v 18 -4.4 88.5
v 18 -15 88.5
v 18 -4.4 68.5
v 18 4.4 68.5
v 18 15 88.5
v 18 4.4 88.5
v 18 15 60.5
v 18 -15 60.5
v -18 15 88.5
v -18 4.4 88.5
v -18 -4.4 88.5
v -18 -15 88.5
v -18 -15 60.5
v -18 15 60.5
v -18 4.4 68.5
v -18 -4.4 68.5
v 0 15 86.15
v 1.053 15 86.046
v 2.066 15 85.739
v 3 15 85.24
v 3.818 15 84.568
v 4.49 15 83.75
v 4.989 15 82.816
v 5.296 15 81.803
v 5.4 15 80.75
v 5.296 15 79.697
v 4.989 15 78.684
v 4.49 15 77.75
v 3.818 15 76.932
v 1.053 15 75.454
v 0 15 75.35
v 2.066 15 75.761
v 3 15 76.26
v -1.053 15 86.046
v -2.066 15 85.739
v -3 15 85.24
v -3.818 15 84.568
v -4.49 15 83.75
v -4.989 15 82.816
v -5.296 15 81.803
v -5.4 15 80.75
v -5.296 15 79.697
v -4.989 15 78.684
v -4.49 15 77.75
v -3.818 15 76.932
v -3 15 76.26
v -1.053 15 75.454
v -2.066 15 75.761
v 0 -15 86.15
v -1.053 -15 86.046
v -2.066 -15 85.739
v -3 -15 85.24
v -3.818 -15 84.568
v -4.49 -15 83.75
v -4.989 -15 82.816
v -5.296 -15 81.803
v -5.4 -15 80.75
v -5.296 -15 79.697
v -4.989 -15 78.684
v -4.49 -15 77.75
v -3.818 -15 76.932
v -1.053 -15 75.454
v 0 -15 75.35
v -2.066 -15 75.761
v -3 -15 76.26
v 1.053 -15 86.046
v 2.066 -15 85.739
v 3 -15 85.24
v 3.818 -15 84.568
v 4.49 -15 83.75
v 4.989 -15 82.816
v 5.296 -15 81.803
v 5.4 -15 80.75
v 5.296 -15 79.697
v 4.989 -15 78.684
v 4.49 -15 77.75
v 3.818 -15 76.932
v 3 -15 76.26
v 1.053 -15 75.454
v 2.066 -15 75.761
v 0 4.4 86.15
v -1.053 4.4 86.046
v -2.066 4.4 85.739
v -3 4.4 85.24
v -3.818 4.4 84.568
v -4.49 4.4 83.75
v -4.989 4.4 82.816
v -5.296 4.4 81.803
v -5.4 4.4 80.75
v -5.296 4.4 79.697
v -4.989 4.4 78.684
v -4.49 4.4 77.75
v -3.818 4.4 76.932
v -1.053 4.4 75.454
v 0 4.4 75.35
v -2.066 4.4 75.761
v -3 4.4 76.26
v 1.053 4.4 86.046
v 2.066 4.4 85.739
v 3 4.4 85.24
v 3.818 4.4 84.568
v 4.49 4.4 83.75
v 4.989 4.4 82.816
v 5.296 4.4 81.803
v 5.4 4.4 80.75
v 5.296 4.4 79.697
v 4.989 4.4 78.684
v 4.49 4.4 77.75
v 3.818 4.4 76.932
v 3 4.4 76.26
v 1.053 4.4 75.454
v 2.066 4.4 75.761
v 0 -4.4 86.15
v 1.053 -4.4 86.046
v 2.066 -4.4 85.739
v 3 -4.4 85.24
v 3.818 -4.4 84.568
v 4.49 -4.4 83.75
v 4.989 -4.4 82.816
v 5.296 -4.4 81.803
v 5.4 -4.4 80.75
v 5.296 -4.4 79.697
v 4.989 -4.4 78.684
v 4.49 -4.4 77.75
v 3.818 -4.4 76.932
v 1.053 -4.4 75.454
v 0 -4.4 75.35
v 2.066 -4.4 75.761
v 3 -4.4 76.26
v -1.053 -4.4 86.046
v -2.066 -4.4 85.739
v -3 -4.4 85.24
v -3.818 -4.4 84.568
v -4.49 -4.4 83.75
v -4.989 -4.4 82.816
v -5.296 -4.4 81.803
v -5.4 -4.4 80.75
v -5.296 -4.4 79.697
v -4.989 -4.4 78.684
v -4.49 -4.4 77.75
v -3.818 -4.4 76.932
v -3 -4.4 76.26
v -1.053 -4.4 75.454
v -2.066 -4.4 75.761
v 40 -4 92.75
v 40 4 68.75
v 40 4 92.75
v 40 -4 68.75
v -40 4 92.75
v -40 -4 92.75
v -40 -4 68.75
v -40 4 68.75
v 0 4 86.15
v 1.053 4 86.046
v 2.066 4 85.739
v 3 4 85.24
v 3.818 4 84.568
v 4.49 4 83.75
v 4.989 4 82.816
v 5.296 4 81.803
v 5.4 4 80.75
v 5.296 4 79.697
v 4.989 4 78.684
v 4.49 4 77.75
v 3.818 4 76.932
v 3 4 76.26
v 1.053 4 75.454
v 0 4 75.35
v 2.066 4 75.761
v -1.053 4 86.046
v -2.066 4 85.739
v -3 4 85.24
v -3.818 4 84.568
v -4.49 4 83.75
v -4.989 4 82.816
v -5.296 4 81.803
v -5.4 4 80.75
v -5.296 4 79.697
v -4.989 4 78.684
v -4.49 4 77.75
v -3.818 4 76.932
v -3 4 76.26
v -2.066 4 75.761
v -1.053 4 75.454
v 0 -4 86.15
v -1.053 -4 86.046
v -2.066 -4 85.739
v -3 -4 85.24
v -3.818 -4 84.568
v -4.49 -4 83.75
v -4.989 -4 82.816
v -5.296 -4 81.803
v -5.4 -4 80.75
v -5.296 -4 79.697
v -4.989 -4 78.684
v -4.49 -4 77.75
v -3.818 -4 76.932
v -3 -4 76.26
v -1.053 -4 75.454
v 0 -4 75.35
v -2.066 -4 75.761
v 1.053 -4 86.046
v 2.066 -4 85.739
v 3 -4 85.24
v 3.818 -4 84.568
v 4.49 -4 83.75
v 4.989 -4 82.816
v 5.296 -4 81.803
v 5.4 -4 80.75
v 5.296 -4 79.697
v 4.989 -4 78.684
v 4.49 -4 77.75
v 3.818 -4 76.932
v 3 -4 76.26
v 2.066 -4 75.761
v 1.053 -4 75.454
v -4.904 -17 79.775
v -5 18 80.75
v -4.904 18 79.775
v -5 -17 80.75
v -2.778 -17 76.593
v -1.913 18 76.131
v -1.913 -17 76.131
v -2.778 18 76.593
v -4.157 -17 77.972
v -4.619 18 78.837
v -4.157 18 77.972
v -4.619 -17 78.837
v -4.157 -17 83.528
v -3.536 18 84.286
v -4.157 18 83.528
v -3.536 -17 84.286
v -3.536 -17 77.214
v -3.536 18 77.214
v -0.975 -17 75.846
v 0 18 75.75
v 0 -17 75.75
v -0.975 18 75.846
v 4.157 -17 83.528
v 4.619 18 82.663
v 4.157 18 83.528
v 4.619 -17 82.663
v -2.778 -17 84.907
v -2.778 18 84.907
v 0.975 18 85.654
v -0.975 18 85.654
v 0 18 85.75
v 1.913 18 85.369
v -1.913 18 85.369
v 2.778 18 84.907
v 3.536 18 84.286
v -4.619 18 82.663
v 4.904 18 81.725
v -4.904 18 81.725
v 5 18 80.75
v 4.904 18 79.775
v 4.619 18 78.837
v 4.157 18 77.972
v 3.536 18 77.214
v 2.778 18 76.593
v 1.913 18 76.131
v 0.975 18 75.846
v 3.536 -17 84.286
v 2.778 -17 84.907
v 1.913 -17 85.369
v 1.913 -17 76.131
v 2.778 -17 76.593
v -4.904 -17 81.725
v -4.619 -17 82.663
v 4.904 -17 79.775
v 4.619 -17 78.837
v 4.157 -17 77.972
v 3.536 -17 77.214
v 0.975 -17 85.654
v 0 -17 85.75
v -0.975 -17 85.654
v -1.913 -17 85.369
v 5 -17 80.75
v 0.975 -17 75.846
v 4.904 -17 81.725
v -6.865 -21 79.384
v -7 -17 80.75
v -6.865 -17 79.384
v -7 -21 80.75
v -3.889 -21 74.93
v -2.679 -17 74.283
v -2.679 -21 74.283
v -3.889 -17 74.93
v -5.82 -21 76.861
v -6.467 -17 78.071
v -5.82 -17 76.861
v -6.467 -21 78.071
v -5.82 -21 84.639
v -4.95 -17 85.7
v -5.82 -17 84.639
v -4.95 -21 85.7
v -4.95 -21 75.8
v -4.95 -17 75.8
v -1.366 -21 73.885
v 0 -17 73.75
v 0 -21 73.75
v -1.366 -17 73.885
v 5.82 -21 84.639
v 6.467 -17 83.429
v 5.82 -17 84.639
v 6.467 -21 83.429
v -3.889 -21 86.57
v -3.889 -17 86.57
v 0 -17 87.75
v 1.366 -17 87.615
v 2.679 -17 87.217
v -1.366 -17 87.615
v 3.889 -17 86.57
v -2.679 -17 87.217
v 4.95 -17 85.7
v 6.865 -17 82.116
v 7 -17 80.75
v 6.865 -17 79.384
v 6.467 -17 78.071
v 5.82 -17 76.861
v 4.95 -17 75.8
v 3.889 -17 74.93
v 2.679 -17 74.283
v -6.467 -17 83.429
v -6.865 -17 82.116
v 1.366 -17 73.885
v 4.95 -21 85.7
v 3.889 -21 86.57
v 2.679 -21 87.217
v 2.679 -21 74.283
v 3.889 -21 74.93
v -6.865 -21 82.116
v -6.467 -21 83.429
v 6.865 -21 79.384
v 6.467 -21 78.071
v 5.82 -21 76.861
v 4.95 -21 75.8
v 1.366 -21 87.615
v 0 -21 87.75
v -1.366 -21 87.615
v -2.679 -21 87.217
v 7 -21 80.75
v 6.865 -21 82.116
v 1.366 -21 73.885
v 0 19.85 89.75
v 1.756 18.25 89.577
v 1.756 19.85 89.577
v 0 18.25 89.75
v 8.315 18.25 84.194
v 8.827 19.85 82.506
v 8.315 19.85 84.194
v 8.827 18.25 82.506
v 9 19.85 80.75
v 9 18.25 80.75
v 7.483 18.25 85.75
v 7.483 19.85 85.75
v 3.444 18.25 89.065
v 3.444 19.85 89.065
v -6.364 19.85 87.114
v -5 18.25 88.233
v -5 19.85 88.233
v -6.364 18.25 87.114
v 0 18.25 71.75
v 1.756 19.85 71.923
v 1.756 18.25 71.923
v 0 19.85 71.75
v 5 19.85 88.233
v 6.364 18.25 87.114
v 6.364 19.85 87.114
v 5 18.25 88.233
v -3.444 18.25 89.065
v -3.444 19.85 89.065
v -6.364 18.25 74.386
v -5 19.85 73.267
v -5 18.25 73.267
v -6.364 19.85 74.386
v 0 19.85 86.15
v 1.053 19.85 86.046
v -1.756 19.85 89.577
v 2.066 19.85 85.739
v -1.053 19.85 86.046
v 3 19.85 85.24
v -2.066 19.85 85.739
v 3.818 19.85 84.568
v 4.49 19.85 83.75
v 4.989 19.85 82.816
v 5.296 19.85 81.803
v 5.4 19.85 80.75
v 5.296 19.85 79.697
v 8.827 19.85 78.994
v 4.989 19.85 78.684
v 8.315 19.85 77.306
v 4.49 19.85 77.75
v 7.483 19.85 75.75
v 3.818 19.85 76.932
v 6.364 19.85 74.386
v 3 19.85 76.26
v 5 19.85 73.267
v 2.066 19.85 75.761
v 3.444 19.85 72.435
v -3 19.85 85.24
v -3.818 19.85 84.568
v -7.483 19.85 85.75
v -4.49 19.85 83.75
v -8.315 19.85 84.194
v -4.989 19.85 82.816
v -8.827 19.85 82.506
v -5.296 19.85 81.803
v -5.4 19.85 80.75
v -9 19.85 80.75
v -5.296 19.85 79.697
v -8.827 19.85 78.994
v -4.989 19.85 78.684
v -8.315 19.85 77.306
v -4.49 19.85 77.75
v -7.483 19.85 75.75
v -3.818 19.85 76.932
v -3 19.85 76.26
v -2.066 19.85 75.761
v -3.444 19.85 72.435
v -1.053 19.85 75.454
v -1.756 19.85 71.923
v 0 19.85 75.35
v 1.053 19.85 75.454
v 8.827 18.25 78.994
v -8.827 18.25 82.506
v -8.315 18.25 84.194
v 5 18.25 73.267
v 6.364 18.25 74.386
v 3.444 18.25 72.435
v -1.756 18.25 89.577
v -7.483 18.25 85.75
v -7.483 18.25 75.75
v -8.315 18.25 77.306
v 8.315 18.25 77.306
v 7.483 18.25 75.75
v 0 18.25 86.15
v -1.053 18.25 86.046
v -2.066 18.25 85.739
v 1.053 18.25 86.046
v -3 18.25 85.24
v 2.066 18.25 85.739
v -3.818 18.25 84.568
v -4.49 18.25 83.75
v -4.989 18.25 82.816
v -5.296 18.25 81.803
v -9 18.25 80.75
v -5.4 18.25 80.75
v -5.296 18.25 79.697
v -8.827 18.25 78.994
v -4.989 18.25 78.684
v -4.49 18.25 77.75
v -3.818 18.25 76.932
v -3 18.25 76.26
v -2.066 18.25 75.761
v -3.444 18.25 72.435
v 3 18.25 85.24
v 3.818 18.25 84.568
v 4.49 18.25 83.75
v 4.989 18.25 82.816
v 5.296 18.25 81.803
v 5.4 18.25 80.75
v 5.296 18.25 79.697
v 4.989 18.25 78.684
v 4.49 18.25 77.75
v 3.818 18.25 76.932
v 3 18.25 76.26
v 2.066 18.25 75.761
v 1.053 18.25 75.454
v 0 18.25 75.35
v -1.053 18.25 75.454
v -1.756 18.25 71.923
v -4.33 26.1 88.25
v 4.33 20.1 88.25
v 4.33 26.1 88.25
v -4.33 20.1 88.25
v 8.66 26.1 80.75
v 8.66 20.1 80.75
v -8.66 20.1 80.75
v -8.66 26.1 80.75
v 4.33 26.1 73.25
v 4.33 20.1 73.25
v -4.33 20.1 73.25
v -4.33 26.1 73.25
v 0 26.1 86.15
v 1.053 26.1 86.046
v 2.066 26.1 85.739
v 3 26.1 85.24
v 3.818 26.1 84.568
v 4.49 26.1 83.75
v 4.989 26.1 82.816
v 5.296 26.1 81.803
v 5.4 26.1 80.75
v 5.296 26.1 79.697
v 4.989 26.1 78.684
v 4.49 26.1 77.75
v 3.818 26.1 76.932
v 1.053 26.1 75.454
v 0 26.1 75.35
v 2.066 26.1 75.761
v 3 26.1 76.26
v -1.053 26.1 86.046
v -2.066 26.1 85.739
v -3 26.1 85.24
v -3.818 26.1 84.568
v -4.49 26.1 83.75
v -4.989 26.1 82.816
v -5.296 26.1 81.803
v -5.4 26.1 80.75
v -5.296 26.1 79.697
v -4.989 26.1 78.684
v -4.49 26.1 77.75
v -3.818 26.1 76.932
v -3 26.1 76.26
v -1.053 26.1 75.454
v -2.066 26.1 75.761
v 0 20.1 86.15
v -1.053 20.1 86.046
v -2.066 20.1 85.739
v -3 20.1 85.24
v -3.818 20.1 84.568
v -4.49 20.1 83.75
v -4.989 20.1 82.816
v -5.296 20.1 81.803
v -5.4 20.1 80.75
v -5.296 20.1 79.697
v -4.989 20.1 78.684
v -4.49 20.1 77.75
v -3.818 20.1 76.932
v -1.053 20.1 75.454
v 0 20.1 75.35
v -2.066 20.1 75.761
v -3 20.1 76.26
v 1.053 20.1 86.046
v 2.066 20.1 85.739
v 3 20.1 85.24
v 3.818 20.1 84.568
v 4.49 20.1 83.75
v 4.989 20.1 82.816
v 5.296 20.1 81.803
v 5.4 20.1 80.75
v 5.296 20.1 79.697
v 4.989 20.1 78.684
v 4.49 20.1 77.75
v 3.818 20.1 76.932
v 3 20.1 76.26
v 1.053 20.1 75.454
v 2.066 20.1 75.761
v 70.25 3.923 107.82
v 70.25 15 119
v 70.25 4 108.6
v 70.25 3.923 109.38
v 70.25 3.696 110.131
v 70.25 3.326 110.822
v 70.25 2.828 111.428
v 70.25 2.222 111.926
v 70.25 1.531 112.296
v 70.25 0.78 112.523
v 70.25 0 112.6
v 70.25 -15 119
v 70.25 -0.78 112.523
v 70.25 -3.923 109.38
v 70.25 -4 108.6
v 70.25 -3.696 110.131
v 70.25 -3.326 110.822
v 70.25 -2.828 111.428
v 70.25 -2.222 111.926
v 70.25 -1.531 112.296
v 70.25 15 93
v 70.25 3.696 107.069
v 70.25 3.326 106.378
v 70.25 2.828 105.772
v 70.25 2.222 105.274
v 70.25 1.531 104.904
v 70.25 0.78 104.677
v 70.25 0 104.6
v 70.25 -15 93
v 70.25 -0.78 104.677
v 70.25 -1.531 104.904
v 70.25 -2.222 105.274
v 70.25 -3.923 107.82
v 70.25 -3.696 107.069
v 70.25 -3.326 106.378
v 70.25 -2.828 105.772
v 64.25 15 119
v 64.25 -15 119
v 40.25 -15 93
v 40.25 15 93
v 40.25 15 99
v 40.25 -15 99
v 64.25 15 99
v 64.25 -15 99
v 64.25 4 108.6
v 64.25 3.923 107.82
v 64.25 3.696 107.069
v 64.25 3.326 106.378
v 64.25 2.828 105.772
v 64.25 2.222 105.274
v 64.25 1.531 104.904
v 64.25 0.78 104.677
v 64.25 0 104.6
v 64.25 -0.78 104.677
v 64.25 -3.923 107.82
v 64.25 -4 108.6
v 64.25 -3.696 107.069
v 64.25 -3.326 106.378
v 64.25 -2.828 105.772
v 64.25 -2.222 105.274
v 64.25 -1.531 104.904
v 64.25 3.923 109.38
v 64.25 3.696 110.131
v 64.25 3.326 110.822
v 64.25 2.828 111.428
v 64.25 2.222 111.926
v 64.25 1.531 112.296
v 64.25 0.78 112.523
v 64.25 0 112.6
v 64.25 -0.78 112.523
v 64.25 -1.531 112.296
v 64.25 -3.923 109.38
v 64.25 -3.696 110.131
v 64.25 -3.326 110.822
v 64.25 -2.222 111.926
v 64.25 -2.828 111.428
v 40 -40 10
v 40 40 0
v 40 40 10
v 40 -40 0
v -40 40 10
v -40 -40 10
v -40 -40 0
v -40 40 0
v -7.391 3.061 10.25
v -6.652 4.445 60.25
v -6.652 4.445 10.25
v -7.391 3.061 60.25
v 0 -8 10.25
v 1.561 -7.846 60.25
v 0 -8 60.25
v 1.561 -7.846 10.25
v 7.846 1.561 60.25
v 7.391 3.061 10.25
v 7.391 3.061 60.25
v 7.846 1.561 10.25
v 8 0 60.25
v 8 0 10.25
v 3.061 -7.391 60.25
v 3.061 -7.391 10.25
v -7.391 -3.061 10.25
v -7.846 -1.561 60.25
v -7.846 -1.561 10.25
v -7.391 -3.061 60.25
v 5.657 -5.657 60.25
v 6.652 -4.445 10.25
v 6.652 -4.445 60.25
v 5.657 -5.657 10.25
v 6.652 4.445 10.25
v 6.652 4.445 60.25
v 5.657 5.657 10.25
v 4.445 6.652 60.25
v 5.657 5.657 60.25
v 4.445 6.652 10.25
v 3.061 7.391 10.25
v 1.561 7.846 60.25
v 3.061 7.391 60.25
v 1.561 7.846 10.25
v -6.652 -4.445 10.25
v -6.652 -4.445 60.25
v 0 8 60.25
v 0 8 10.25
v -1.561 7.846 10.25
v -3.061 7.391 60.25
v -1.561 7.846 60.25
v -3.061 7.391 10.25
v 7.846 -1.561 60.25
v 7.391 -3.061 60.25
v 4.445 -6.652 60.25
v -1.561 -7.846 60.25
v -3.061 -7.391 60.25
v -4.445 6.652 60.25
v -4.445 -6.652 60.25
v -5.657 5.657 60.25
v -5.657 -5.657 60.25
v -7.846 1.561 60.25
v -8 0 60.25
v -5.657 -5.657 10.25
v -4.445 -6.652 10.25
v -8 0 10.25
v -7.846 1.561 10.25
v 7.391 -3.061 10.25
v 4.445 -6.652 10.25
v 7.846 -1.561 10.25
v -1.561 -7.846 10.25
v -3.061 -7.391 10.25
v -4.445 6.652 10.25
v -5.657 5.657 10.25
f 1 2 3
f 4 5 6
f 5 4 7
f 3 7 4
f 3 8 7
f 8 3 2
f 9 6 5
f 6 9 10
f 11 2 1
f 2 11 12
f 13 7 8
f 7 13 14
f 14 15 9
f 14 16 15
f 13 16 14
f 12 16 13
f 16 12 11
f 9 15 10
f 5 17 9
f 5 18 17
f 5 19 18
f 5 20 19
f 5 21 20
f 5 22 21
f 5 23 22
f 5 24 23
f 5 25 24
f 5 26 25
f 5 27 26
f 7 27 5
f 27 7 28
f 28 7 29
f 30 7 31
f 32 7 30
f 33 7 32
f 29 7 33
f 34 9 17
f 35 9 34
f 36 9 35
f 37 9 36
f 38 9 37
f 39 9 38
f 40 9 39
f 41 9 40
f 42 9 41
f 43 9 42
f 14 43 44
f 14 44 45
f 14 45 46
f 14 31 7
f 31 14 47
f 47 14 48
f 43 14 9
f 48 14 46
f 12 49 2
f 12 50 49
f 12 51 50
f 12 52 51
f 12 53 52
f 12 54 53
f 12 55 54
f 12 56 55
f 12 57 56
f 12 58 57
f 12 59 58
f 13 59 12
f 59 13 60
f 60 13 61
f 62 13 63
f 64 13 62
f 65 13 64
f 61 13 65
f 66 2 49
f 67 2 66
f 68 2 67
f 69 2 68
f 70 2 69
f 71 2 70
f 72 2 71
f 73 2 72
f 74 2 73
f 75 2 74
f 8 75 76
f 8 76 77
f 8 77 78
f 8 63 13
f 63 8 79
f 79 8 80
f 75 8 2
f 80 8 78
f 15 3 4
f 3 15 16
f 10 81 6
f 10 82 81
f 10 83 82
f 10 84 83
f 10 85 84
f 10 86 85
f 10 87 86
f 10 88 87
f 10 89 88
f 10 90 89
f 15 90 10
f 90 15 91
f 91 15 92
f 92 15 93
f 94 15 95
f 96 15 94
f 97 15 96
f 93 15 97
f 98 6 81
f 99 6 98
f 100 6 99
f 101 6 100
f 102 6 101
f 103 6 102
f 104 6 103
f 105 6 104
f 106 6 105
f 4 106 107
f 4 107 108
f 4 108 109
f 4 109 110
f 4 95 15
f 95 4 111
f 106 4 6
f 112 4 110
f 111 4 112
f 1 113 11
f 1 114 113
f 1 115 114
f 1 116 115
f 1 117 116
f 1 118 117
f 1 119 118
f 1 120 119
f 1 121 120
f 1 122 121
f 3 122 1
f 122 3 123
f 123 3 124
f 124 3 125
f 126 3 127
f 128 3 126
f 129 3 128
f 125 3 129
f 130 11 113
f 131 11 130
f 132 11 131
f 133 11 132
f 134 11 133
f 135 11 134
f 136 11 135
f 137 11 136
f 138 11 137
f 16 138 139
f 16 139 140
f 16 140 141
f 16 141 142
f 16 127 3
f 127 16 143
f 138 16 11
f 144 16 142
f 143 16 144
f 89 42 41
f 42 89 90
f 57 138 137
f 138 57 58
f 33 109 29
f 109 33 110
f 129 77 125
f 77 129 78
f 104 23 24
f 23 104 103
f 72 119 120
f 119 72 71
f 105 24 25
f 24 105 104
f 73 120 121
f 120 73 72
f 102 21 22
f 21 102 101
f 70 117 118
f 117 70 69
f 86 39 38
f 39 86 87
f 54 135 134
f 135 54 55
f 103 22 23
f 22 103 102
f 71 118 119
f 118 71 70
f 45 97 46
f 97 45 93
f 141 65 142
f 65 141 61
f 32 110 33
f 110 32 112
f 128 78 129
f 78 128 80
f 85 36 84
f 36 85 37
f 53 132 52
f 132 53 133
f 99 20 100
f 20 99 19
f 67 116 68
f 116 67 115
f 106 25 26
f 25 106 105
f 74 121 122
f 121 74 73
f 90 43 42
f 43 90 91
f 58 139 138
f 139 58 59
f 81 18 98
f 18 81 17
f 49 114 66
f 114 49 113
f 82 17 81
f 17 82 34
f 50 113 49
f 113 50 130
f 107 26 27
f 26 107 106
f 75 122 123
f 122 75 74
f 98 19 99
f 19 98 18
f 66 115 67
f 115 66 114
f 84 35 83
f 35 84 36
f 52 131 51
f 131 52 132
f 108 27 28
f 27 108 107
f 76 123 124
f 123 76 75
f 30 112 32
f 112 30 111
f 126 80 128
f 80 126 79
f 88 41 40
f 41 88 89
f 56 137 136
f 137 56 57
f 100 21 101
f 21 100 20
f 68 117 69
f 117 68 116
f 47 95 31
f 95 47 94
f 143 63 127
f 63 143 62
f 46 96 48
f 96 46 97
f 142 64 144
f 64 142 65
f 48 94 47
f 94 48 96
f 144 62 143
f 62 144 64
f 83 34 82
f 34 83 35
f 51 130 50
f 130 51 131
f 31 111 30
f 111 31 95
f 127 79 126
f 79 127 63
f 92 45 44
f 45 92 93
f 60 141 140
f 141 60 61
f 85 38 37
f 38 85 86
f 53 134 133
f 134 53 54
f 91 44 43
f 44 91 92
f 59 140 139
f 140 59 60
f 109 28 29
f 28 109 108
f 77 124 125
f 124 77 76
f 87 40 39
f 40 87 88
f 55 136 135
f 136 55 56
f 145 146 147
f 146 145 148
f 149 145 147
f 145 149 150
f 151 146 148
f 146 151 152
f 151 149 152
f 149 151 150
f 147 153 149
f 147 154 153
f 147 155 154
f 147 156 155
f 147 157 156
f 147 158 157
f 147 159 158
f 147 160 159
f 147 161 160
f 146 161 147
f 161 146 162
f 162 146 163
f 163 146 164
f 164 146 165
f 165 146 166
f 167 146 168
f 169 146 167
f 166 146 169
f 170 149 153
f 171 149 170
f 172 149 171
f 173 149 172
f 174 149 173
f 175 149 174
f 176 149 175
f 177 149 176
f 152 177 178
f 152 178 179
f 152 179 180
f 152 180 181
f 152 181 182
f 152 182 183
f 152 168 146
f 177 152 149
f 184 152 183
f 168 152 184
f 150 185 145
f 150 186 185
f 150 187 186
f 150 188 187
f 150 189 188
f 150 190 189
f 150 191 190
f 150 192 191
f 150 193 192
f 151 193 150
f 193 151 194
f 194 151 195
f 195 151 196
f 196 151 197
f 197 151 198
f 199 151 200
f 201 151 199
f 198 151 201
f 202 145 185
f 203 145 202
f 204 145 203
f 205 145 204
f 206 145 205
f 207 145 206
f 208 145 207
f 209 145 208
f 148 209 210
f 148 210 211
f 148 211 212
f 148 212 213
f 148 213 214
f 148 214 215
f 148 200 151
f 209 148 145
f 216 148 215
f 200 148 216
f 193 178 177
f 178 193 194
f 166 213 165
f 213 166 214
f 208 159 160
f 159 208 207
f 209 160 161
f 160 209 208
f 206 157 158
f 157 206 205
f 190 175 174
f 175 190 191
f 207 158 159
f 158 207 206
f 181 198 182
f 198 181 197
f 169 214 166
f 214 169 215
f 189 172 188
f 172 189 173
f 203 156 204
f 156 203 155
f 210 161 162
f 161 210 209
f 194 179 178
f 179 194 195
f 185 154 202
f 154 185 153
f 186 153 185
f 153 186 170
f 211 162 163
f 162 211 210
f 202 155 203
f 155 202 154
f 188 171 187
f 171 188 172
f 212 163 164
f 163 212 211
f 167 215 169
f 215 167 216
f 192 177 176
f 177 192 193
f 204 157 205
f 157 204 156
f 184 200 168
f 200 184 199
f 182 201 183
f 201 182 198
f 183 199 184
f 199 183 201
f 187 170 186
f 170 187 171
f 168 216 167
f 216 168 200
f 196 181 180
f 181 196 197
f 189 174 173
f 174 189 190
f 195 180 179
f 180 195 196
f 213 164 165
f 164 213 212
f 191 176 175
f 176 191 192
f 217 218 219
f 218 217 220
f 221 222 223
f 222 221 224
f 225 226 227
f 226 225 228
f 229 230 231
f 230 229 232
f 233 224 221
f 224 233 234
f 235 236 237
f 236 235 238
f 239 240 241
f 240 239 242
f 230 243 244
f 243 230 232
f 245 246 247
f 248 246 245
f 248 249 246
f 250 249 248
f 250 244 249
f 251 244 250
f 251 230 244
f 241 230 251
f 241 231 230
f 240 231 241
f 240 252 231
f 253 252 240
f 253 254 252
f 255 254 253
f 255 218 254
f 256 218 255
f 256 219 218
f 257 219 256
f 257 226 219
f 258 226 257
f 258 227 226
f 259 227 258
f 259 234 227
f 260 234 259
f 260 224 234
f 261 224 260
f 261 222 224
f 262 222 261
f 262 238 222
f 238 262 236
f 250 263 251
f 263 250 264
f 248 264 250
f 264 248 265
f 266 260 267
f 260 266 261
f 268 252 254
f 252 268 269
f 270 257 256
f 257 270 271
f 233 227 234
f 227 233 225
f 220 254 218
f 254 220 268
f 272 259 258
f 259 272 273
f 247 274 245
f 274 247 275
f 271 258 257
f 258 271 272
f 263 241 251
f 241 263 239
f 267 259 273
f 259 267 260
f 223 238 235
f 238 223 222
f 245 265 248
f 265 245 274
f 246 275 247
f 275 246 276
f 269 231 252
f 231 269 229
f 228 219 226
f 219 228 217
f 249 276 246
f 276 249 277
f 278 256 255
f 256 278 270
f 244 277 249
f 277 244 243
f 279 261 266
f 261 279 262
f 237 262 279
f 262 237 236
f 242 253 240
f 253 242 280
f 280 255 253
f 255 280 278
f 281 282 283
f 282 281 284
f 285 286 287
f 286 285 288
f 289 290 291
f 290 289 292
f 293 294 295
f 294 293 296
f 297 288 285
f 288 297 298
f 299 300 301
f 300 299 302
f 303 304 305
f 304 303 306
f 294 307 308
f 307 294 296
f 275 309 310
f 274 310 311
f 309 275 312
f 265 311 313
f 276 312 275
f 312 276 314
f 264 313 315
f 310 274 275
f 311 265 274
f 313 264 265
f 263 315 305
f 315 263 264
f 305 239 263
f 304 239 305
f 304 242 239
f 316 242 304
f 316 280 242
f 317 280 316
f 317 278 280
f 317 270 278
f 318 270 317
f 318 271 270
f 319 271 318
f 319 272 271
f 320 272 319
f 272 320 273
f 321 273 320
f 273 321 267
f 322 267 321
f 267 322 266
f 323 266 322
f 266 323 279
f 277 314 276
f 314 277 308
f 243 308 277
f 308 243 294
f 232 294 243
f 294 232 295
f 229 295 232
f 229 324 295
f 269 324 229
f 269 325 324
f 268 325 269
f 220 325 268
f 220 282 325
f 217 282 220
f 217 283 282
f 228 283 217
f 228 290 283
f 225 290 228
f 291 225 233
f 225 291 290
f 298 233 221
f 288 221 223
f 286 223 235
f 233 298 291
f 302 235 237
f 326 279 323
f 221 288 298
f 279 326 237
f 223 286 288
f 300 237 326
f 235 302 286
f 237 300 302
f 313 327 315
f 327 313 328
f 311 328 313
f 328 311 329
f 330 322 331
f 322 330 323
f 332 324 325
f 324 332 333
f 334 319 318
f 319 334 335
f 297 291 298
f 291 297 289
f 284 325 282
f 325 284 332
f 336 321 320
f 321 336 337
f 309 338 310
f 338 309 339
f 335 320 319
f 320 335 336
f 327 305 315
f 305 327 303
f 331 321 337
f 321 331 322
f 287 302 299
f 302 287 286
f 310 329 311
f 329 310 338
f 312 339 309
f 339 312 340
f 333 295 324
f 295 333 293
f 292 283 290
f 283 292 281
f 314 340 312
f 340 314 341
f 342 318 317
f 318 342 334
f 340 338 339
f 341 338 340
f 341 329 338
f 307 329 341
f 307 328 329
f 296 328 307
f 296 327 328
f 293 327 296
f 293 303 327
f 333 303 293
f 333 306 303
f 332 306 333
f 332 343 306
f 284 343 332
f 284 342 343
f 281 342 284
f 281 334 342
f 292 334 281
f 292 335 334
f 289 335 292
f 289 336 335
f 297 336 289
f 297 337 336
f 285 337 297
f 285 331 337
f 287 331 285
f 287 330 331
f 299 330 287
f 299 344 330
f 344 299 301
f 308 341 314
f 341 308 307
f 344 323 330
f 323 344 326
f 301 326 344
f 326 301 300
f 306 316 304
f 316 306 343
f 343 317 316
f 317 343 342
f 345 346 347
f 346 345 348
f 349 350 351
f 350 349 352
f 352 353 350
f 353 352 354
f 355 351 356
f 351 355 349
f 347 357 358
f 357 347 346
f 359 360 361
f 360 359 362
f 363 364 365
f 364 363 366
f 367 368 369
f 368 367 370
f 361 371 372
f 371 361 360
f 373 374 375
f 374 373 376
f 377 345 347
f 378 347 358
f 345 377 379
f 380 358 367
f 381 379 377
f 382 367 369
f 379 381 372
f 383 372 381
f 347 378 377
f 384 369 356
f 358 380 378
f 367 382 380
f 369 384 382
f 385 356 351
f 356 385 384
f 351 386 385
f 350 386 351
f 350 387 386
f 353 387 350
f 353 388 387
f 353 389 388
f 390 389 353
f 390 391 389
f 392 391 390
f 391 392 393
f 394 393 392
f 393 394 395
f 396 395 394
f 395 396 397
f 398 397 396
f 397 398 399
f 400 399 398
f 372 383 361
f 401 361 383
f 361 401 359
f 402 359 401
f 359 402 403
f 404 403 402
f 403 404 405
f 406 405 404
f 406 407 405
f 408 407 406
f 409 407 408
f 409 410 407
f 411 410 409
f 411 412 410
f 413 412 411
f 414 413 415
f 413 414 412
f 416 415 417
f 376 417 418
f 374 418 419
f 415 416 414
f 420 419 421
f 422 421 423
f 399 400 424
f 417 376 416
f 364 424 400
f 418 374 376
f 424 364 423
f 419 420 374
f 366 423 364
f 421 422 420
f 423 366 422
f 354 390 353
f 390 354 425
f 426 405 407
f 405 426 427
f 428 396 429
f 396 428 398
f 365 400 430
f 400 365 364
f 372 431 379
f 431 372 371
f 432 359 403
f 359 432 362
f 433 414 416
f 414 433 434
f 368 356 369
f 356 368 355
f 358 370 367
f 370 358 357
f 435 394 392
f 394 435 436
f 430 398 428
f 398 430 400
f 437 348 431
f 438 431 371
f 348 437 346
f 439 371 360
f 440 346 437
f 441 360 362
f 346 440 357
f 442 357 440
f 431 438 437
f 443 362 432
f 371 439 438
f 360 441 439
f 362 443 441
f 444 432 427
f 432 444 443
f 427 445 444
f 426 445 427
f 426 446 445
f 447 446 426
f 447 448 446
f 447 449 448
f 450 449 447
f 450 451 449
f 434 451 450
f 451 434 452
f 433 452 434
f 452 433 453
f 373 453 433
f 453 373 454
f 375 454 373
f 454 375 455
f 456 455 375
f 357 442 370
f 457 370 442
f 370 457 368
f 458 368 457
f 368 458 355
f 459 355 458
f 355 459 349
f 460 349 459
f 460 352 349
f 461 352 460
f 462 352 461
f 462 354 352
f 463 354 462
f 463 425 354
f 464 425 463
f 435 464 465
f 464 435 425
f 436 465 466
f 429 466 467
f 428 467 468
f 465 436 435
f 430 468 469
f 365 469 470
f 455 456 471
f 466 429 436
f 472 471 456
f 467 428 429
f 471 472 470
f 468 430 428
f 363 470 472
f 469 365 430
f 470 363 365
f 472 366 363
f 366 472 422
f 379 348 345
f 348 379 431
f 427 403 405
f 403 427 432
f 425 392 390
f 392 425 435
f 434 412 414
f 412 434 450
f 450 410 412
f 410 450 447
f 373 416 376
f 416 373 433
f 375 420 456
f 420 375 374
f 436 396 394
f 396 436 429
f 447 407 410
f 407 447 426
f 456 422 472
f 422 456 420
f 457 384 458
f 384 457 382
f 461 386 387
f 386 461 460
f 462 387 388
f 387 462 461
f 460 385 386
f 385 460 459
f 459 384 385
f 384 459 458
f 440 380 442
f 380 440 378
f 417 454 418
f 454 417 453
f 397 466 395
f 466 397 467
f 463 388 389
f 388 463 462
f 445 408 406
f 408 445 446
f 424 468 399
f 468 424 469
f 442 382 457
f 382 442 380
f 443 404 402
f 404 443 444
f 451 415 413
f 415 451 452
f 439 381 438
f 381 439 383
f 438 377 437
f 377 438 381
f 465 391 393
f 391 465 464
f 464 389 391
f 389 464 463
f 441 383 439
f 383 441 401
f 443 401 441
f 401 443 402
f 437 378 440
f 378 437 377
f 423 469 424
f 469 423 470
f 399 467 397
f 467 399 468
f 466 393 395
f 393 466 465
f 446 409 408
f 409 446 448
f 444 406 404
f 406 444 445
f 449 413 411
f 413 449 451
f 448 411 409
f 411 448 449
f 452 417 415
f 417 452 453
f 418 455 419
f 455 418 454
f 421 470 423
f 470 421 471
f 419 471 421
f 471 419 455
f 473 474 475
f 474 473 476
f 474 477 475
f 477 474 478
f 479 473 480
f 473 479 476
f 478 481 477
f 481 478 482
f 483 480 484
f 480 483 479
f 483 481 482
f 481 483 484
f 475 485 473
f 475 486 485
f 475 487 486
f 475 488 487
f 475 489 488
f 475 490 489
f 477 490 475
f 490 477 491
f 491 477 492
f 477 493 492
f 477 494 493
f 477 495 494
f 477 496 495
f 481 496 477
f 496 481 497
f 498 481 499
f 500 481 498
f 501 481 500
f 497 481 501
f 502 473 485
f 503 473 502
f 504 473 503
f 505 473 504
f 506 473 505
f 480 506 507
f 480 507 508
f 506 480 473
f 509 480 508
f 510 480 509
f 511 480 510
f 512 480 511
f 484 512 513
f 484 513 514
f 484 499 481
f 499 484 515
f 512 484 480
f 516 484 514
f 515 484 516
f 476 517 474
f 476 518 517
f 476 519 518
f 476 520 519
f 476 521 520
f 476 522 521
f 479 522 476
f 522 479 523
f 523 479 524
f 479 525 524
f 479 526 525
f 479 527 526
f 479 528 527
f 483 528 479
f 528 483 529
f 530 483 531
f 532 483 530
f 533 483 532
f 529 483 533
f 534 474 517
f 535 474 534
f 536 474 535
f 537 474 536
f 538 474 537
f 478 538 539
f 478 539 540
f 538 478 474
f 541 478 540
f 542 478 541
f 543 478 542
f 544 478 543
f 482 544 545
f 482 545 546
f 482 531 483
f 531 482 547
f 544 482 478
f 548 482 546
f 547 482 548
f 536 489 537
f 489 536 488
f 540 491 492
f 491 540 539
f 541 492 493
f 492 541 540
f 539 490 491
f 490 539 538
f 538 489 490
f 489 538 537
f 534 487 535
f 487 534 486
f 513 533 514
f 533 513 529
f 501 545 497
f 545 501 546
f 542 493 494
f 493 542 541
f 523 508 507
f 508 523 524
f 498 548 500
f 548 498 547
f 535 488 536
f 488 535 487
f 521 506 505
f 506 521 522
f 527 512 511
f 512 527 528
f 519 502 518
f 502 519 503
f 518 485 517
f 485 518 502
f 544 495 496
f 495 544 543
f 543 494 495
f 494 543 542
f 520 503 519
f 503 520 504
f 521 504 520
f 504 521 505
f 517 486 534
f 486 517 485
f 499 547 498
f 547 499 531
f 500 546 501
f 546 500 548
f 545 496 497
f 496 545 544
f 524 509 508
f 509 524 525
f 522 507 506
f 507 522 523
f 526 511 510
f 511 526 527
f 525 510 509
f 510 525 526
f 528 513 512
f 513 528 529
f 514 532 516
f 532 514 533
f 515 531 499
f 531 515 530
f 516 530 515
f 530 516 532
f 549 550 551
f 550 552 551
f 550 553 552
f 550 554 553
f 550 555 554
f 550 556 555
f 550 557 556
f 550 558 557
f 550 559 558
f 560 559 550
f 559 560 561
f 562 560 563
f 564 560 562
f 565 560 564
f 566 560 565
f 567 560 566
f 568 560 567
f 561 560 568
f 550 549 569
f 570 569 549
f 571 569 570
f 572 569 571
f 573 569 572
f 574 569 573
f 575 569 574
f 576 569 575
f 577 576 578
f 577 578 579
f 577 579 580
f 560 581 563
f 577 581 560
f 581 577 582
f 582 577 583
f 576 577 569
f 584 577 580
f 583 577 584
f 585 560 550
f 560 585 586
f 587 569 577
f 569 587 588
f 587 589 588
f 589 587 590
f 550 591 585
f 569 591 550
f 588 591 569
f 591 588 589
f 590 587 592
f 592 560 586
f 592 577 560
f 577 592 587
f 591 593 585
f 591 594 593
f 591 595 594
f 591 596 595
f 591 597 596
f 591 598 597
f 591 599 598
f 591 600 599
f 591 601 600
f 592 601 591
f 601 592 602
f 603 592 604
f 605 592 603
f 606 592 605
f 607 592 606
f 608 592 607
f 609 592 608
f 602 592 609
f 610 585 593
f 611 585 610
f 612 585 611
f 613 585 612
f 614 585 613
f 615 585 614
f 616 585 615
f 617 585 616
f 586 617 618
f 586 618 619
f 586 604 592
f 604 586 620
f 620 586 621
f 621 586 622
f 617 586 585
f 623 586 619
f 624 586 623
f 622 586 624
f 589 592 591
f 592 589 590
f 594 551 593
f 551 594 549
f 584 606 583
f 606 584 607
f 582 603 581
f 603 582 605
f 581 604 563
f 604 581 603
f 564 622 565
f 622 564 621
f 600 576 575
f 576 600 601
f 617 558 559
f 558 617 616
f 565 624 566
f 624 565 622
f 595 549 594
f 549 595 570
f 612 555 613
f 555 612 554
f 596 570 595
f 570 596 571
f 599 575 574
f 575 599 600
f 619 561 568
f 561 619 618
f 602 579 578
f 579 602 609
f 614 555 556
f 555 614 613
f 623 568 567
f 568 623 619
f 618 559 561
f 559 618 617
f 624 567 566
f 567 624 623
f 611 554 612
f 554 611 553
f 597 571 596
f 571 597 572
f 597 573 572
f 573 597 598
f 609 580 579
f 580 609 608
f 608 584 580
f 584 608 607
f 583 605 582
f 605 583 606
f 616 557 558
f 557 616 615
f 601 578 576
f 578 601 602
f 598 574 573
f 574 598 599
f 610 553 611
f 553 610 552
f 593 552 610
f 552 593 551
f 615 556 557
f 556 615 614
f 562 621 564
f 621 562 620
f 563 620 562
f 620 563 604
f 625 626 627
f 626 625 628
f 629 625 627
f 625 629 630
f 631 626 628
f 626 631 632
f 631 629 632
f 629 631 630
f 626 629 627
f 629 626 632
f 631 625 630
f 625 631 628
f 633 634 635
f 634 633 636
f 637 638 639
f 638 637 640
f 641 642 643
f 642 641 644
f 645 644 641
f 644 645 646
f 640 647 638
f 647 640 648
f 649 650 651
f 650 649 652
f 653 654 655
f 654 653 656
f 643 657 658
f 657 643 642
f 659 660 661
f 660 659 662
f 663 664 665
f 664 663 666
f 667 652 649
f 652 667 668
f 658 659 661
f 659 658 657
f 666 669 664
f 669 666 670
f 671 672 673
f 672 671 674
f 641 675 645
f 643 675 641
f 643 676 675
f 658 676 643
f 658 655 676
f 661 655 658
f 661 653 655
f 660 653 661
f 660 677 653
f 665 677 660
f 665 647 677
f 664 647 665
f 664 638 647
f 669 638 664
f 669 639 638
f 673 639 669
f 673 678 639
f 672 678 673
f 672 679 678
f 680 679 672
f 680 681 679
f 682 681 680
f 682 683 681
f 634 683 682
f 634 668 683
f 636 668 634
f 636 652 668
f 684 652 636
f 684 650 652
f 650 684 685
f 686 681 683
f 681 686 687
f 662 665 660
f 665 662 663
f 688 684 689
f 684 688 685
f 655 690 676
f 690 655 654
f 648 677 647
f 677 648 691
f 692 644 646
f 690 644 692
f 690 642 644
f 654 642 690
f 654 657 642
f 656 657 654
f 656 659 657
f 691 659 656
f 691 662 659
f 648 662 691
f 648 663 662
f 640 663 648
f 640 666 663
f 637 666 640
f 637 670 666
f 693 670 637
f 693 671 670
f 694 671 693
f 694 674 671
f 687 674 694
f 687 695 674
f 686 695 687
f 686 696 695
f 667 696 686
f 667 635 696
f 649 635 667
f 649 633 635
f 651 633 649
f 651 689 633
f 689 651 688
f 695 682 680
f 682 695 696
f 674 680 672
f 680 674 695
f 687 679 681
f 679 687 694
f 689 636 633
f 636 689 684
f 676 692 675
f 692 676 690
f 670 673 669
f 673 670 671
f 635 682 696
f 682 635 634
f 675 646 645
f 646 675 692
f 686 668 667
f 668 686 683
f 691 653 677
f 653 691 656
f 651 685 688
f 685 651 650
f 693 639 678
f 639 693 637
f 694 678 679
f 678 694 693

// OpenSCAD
$fn = 32;

// ------------------------------------------------------------------------
// Lamp arm: column d16 x 50 mm, arm 80 mm
// Every part is its own module, assembly() places every instance.
// ------------------------------------------------------------------------

// --- part 1 ---
module lamp_base() {
  difference() {
    translate([-40, -40, 0]) cube([80, 80, 10]);
  }
}

// --- part 2 ---
module lamp_column() {
  cylinder(h = 50, d = 16);
}

// --- part 3 ---
module head_fork() {
  difference() {
    translate([-18, -15, 0]) cube([36, 30, 28]);
    translate([-19, -4.4, 8]) cube([38, 8.8, 21]);
    translate([0, 0, 20.25]) rotate([90, 0, 0]) cylinder(h = 32, d = 10.8, center = true);
  }
}

// --- part 4 ---
module lamp_arm() {
  difference() {
    translate([-40, -4, 0]) cube([80, 8, 24]);
    translate([0, 0, 12]) rotate([90, 0, 0]) cylinder(h = 10, d = 10.8, center = true);
  }
}

// --- part 5 ---
module arm_pin() {
  rotate([0, 90, 0]) cylinder(h = 36, d = 10, center = true);
  translate([-21, 0, 0]) rotate([0, 90, 0]) cylinder(h = 4, d = 14);
}

// --- part 6 ---
module arm_washer() {
  difference() {
      translate([0, 0, 0]) cylinder(h = 1.6, d = 18);
      translate([0, 0, -1]) cylinder(h = 3.6, d = 10.8);
    }
}

// --- part 7 ---
module arm_nut() {
  difference() {
    linear_extrude(height = 6) polygon(points = [[8.66, 0], [4.33, 7.5], [-4.33, 7.5], [-8.66, 0], [-4.33, -7.5], [4.33, -7.5]]);
    translate([0, 0, -1]) cylinder(h = 8, d = 10.8);
  }
}

// --- part 8 ---
module shade_bracket() {
  difference() {
    translate([-15, -15, 0]) cube([30, 30, 26]);
    translate([-16, -16, 6]) cube([25, 32, 21]);
    translate([12, 0, 15.6]) rotate([0, 90, 0]) cylinder(h = 8, d = 8, center = true);
  }
}

// --- assembly ---
module assembly() {
  color([0.80, 0.24, 0.20]) translate([0, 0, 0]) rotate([0, 0, 0]) lamp_base();
  color([0.20, 0.45, 0.75]) translate([0, 0, 10.25]) rotate([0, 0, 0]) lamp_column();
  color([0.25, 0.62, 0.32]) translate([0, 0, 60.5]) rotate([0, 0, 0]) head_fork();
  color([0.92, 0.70, 0.18]) translate([0, 0, 68.75]) rotate([0, 0, 0]) lamp_arm();
  color([0.58, 0.35, 0.70]) translate([0, 0, 80.75]) rotate([0, 0, 90]) arm_pin();
  color([0.16, 0.66, 0.66]) translate([0, 19.85, 80.75]) rotate([90, 0, 0]) arm_washer();
  color([0.85, 0.48, 0.18]) translate([0, 26.1, 80.75]) rotate([90, 0, 0]) arm_nut();
  color([0.55, 0.60, 0.65]) translate([55.25, 0, 93]) rotate([0, 0, 0]) shade_bracket();
}

assembly();
